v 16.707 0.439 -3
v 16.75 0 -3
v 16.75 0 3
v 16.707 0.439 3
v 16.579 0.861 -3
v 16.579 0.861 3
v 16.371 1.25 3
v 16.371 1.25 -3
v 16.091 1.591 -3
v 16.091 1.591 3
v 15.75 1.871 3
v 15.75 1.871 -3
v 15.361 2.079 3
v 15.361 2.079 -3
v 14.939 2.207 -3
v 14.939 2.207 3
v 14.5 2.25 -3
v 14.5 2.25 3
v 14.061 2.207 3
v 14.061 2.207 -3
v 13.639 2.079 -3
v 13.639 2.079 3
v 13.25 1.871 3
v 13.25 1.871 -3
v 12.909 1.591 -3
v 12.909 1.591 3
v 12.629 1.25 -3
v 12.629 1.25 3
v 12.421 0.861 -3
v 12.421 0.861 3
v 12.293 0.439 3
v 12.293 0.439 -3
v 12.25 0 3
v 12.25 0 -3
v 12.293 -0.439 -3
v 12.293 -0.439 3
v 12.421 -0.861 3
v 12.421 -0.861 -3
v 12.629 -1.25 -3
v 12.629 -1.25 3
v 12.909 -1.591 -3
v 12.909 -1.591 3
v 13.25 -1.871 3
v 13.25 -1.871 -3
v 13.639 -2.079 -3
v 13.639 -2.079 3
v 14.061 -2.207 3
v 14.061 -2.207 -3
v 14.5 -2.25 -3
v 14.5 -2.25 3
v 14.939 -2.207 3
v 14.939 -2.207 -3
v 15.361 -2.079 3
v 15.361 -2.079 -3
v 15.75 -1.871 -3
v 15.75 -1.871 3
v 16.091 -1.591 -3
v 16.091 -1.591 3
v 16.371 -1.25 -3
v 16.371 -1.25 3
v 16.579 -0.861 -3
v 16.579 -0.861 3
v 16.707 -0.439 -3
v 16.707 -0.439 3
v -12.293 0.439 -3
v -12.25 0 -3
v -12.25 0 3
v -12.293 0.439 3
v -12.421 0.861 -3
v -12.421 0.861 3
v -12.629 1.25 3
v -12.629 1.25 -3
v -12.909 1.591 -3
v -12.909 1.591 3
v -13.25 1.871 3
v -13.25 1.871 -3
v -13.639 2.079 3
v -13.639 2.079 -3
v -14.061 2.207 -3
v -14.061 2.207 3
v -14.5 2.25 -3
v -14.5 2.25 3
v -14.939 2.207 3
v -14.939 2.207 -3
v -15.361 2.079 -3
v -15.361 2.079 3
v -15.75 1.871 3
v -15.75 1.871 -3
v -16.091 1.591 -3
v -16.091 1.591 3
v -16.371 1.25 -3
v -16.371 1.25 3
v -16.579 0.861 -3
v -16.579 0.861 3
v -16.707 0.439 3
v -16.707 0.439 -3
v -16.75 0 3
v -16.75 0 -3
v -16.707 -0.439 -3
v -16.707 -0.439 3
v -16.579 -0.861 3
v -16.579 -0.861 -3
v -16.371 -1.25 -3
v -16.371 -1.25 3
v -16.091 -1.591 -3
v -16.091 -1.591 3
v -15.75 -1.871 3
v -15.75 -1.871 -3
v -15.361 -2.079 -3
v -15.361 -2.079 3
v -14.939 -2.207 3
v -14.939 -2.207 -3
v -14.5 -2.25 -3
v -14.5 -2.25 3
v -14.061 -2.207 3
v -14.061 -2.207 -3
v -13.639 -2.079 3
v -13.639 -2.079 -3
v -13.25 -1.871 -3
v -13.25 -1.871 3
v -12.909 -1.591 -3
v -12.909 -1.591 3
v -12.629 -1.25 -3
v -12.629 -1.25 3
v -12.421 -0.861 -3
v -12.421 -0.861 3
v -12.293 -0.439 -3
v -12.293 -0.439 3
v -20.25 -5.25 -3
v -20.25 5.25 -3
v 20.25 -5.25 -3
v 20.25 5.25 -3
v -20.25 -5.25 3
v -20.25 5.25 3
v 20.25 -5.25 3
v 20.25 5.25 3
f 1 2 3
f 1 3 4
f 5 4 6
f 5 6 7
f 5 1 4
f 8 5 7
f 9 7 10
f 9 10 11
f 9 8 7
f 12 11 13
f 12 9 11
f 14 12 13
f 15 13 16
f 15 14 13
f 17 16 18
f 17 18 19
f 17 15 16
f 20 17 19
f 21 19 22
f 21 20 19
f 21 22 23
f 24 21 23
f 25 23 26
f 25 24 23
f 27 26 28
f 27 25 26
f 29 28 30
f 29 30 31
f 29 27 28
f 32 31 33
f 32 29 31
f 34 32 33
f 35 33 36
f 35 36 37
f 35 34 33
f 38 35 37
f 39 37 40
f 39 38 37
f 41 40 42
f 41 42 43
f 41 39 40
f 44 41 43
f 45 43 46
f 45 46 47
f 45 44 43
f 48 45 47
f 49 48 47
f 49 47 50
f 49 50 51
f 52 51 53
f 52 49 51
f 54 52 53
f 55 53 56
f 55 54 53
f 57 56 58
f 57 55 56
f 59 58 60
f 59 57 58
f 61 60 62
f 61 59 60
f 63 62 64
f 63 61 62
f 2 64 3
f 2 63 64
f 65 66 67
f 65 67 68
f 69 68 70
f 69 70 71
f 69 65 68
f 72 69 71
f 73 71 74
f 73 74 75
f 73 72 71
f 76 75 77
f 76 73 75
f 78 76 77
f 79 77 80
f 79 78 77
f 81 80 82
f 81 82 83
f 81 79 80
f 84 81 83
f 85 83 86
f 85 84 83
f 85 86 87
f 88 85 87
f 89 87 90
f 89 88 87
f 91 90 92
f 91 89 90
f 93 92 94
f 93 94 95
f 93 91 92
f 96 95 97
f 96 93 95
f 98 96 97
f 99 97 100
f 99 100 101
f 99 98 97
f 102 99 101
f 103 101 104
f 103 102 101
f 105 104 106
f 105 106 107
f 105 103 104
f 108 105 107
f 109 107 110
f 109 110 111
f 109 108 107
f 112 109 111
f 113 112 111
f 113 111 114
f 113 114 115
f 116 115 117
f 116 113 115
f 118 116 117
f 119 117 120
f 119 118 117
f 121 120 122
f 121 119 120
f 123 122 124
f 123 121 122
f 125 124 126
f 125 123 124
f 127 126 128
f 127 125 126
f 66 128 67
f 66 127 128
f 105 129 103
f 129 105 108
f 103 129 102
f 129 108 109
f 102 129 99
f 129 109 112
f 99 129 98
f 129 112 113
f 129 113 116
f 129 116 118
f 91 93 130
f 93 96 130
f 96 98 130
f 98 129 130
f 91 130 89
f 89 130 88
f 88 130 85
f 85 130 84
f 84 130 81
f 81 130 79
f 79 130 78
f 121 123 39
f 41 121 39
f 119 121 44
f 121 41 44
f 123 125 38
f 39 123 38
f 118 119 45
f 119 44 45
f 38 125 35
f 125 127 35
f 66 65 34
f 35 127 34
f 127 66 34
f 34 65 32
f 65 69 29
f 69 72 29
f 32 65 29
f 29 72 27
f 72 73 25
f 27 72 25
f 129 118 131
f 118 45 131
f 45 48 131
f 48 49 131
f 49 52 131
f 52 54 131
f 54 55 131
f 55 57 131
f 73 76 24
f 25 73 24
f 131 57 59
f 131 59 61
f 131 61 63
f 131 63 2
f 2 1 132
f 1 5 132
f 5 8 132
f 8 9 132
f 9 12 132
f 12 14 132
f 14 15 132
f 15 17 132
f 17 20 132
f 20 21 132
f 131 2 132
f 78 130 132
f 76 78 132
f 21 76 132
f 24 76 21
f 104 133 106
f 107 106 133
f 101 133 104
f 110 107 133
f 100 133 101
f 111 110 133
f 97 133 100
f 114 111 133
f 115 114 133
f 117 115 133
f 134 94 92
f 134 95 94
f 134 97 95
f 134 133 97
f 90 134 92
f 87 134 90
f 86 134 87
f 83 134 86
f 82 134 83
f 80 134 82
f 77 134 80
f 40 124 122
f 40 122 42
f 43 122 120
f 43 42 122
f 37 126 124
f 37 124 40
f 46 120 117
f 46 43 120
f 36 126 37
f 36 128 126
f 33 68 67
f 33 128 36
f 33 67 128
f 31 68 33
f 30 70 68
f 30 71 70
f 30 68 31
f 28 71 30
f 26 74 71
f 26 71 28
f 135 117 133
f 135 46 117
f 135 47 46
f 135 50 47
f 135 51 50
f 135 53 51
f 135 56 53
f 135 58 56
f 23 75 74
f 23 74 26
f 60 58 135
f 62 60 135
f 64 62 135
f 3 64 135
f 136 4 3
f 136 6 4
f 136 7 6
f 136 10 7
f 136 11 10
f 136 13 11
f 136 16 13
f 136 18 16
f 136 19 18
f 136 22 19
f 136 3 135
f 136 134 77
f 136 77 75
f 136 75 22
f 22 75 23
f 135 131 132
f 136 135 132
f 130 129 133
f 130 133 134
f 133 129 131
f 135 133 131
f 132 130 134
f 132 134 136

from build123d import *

# Parameters (mm, degrees)
BOSS_EXTRUDE1_DEPTH      = 3
BOSS_EXTRUDE1_DEPTH_BACK = 3
SKETCH1_W                = 40.5
SKETCH1_H                = 10.5
SKETCH1_R                = 2.25


with BuildPart() as part:
    # Sketch1 → Boss-Extrude1 (new, two sides: drawn at the far end of the back side and taken through both)
    with BuildSketch(Plane.XY.offset(-BOSS_EXTRUDE1_DEPTH_BACK)):
        Rectangle(SKETCH1_W, SKETCH1_H)
        with Locations((-14.5, 0)):
            Circle(SKETCH1_R, mode=Mode.SUBTRACT)
        with Locations((14.5, 0)):
            Circle(SKETCH1_R, mode=Mode.SUBTRACT)
    extrude(amount=BOSS_EXTRUDE1_DEPTH + BOSS_EXTRUDE1_DEPTH_BACK)


solid = part.part
